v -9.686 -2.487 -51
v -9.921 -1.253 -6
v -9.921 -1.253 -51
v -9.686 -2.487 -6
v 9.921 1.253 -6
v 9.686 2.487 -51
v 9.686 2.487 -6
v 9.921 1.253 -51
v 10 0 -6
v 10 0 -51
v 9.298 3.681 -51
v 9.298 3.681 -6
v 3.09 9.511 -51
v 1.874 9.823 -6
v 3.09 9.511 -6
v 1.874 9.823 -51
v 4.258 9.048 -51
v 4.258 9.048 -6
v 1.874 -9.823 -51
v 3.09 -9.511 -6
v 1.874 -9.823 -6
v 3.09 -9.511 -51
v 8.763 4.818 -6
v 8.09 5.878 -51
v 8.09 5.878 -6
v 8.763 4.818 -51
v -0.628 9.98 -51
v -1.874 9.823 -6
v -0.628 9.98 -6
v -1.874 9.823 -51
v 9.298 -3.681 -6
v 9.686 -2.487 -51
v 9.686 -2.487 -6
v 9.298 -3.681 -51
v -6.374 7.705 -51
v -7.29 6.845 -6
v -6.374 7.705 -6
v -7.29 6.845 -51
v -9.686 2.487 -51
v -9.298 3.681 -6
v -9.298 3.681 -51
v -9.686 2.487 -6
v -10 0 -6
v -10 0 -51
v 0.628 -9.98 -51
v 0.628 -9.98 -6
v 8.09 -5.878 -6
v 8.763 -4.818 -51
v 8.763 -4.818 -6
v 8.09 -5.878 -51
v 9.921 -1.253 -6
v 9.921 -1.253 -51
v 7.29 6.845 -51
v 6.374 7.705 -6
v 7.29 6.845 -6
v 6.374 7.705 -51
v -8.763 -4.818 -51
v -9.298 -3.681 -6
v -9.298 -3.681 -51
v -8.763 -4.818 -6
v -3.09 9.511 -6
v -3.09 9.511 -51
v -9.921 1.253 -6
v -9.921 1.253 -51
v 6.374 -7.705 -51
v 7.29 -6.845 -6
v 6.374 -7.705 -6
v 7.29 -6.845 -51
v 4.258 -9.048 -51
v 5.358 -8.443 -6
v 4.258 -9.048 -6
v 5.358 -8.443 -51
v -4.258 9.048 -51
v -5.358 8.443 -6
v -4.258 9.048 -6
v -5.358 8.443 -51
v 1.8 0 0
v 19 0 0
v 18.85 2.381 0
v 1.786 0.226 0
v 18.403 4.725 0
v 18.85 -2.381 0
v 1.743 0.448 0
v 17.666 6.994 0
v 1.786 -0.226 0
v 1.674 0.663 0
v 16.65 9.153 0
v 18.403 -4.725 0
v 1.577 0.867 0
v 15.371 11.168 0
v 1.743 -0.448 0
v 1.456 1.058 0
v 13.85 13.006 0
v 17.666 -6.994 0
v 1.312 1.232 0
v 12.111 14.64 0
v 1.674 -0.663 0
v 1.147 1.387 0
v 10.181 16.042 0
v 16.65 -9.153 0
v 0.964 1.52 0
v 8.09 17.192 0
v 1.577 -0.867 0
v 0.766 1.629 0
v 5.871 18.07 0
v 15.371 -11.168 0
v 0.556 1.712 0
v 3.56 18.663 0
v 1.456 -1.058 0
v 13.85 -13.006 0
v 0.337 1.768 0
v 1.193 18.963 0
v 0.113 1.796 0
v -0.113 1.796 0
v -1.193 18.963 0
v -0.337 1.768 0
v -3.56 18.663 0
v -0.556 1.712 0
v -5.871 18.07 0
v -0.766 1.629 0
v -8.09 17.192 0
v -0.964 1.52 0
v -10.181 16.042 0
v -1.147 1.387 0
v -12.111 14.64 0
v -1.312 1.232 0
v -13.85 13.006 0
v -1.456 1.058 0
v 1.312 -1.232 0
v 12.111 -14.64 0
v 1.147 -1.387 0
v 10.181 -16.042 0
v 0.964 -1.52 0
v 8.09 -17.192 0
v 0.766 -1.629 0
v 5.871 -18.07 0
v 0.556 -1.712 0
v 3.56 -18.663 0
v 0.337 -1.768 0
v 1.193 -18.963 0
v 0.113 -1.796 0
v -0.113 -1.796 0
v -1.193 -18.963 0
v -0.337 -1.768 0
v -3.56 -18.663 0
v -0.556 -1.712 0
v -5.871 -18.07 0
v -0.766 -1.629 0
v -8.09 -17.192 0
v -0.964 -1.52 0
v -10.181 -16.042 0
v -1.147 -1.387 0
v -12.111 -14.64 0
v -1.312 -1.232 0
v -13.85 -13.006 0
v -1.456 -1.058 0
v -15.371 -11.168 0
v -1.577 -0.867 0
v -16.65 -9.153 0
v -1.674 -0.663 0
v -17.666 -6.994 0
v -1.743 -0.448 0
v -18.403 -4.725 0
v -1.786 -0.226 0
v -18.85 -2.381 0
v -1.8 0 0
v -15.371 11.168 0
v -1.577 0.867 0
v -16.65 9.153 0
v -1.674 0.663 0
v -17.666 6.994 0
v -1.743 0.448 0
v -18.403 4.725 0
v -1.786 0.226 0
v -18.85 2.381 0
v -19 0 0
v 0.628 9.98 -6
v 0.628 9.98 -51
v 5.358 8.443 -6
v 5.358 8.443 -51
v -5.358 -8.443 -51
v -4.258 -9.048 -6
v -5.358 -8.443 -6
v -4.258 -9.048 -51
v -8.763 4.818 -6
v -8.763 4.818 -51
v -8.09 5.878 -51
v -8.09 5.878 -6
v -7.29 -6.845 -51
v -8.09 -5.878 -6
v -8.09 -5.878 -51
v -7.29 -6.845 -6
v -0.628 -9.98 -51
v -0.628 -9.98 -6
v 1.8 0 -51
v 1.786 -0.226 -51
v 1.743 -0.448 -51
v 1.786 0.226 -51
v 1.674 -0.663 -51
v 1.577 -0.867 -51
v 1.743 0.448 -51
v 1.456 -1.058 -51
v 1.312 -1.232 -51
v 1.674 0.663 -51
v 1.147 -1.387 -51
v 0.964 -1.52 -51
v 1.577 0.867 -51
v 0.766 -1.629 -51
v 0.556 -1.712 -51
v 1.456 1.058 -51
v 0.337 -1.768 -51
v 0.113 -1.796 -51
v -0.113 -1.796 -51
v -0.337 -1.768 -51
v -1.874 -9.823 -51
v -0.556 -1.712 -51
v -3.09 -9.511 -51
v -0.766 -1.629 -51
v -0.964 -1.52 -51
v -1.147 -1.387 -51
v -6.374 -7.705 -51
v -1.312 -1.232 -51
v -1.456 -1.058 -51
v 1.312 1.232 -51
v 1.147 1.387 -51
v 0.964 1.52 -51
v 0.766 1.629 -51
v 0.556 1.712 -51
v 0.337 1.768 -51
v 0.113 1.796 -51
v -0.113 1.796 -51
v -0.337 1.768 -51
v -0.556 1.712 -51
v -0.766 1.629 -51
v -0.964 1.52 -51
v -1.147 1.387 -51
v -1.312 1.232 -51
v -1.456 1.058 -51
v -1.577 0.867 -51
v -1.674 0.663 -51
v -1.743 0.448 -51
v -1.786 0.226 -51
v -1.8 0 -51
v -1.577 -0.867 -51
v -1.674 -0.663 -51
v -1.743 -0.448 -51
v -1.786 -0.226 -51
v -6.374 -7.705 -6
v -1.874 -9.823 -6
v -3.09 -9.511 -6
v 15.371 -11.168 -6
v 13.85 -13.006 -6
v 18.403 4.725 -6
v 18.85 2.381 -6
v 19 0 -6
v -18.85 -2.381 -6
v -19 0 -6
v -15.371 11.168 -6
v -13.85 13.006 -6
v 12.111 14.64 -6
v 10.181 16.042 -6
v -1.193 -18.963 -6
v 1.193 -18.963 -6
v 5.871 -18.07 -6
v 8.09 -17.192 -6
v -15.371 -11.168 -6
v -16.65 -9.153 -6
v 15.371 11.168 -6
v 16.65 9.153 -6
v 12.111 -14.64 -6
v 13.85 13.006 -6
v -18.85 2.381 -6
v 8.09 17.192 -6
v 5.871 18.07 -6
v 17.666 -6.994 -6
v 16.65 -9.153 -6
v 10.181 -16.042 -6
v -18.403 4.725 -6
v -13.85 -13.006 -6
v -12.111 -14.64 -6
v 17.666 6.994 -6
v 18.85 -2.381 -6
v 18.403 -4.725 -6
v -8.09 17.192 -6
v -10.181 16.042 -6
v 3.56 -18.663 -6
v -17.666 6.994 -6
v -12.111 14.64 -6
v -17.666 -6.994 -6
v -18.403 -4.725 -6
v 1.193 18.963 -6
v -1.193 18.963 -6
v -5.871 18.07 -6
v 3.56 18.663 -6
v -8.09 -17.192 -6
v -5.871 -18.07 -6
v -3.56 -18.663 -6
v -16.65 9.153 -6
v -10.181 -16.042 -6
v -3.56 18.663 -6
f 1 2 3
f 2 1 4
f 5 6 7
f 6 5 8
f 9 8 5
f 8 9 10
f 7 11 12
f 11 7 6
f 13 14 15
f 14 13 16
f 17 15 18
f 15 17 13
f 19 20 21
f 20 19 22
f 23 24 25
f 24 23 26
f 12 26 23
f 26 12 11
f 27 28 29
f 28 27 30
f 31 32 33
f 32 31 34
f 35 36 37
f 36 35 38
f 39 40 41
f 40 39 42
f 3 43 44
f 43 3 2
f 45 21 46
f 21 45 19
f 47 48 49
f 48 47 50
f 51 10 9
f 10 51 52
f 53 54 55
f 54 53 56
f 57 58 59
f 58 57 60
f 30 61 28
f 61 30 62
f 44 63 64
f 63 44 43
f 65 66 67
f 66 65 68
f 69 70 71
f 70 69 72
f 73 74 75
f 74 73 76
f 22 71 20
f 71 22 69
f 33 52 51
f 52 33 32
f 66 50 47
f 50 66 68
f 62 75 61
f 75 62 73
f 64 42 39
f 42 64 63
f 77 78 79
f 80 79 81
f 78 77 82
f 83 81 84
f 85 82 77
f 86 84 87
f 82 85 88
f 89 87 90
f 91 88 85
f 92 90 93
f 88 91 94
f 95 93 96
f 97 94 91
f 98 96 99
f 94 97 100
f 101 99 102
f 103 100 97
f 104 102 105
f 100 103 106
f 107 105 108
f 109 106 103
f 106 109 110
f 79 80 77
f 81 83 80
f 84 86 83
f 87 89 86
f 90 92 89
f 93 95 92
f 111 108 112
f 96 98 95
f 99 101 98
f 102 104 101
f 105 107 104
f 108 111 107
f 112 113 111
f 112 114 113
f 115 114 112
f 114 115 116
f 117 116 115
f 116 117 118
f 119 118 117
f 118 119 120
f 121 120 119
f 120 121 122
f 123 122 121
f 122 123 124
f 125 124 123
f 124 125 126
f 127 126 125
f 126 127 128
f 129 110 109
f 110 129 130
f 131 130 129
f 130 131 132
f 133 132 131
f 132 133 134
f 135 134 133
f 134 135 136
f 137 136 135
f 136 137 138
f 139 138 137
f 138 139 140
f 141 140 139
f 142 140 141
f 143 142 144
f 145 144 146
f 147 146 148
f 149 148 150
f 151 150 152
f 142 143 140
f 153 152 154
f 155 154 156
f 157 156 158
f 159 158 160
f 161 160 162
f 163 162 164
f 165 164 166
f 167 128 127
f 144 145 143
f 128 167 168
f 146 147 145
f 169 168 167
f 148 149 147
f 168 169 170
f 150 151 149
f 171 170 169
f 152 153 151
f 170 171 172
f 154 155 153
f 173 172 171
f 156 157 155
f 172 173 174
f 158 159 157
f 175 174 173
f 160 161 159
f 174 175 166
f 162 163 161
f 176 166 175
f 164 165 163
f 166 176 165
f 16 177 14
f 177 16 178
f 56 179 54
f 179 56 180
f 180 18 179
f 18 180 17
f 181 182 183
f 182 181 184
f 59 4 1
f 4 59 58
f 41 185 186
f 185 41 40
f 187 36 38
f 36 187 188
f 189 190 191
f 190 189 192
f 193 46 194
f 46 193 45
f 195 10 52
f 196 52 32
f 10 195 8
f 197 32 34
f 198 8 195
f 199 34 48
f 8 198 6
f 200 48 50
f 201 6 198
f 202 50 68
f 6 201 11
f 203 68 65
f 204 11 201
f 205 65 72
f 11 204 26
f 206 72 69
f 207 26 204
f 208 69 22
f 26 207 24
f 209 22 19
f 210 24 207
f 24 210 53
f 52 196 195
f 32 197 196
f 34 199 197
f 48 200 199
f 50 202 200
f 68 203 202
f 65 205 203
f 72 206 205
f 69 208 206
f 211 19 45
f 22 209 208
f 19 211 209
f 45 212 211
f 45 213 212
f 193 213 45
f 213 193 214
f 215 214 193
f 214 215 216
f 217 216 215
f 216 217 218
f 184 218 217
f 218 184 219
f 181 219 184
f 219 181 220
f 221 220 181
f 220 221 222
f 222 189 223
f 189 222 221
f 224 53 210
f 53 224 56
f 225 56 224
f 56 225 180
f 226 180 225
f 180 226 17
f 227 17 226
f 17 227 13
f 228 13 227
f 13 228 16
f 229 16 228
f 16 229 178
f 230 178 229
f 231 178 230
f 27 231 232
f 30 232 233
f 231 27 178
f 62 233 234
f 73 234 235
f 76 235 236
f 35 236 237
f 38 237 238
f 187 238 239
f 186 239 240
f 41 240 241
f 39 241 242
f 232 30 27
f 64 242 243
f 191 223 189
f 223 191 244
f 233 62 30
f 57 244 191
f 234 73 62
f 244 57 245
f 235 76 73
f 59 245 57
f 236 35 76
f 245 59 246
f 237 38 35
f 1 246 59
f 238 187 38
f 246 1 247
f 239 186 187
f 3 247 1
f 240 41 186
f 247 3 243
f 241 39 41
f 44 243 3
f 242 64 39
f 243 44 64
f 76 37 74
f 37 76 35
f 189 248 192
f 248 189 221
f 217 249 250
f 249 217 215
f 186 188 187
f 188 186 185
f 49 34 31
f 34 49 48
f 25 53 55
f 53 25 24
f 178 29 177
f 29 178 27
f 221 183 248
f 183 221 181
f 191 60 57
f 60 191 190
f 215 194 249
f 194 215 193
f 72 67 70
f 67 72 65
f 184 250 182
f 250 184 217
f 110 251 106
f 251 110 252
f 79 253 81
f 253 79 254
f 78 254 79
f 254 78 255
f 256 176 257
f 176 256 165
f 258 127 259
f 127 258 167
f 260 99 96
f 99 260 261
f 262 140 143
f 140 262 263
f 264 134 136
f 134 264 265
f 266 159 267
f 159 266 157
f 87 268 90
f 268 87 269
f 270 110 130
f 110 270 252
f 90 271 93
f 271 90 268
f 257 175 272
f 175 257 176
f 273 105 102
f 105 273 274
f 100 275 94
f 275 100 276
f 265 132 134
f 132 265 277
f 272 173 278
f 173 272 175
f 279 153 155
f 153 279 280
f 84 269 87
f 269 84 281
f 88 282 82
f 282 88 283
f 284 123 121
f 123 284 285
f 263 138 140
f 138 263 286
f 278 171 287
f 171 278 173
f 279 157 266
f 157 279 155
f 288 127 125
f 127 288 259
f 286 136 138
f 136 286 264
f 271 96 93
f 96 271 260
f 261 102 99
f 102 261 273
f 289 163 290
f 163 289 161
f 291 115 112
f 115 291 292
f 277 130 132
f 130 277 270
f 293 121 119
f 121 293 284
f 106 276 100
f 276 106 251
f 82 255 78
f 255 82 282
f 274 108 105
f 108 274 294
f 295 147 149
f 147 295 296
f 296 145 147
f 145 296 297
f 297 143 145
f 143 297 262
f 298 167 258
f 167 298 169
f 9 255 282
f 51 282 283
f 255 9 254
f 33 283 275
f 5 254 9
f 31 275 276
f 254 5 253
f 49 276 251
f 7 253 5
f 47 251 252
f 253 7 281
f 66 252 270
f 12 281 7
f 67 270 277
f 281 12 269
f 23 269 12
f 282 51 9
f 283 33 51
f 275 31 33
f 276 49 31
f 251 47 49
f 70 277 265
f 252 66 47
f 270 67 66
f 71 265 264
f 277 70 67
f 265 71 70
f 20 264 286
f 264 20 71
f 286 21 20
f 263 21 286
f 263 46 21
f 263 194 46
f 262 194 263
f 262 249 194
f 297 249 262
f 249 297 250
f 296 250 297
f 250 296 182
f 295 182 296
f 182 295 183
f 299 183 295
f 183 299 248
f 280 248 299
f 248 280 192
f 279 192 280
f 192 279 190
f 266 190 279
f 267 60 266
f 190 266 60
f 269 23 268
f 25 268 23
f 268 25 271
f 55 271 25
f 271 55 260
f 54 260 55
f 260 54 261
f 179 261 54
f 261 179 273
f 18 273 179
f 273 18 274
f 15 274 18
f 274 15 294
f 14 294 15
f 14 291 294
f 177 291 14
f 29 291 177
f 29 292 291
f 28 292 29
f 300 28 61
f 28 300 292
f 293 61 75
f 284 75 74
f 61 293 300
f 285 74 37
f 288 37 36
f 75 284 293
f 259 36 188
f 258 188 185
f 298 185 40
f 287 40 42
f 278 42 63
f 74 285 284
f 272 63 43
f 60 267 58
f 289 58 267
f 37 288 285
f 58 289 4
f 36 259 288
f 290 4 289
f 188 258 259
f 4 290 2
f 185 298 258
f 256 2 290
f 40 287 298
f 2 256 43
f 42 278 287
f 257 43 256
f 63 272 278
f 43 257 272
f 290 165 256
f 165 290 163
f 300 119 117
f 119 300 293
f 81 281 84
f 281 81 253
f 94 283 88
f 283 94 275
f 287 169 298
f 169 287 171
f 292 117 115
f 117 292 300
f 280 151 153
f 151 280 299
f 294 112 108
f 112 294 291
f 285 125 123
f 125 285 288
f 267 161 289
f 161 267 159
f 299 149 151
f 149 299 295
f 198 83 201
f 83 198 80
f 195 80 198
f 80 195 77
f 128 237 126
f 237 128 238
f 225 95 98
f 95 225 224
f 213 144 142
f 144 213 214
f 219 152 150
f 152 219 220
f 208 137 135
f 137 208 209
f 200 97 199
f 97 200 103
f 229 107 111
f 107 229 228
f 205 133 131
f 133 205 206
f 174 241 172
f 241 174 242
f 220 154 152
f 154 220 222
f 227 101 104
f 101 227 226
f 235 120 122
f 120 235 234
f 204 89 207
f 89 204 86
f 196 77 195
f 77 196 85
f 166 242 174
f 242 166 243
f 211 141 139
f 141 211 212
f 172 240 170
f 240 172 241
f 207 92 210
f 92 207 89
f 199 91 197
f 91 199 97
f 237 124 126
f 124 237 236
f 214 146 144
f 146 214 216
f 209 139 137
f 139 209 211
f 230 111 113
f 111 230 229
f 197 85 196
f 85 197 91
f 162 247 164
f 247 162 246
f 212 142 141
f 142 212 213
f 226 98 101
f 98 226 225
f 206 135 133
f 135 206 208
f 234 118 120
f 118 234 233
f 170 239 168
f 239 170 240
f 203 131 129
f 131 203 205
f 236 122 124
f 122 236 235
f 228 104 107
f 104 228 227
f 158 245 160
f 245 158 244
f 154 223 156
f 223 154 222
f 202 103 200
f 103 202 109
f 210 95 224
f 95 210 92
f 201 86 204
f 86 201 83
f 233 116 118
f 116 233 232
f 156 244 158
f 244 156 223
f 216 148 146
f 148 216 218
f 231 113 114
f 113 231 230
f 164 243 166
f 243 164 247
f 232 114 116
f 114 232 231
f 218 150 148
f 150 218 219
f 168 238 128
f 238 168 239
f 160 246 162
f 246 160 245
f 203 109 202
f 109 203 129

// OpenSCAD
$fn = 50;


difference() {
	union() {
		translate(v = [0, 0, -51.0000000000]) {
			cylinder(h = 51, r = 10.0000000000);
		}
		translate(v = [0, 0, -6.0000000000]) {
			cylinder(h = 6, r = 19.0000000000);
		}
	}
	union() {
		#translate(v = [0, 0, -51]) {
			cylinder(h = 51, r = 1.8000000000);
		}
	}
}
